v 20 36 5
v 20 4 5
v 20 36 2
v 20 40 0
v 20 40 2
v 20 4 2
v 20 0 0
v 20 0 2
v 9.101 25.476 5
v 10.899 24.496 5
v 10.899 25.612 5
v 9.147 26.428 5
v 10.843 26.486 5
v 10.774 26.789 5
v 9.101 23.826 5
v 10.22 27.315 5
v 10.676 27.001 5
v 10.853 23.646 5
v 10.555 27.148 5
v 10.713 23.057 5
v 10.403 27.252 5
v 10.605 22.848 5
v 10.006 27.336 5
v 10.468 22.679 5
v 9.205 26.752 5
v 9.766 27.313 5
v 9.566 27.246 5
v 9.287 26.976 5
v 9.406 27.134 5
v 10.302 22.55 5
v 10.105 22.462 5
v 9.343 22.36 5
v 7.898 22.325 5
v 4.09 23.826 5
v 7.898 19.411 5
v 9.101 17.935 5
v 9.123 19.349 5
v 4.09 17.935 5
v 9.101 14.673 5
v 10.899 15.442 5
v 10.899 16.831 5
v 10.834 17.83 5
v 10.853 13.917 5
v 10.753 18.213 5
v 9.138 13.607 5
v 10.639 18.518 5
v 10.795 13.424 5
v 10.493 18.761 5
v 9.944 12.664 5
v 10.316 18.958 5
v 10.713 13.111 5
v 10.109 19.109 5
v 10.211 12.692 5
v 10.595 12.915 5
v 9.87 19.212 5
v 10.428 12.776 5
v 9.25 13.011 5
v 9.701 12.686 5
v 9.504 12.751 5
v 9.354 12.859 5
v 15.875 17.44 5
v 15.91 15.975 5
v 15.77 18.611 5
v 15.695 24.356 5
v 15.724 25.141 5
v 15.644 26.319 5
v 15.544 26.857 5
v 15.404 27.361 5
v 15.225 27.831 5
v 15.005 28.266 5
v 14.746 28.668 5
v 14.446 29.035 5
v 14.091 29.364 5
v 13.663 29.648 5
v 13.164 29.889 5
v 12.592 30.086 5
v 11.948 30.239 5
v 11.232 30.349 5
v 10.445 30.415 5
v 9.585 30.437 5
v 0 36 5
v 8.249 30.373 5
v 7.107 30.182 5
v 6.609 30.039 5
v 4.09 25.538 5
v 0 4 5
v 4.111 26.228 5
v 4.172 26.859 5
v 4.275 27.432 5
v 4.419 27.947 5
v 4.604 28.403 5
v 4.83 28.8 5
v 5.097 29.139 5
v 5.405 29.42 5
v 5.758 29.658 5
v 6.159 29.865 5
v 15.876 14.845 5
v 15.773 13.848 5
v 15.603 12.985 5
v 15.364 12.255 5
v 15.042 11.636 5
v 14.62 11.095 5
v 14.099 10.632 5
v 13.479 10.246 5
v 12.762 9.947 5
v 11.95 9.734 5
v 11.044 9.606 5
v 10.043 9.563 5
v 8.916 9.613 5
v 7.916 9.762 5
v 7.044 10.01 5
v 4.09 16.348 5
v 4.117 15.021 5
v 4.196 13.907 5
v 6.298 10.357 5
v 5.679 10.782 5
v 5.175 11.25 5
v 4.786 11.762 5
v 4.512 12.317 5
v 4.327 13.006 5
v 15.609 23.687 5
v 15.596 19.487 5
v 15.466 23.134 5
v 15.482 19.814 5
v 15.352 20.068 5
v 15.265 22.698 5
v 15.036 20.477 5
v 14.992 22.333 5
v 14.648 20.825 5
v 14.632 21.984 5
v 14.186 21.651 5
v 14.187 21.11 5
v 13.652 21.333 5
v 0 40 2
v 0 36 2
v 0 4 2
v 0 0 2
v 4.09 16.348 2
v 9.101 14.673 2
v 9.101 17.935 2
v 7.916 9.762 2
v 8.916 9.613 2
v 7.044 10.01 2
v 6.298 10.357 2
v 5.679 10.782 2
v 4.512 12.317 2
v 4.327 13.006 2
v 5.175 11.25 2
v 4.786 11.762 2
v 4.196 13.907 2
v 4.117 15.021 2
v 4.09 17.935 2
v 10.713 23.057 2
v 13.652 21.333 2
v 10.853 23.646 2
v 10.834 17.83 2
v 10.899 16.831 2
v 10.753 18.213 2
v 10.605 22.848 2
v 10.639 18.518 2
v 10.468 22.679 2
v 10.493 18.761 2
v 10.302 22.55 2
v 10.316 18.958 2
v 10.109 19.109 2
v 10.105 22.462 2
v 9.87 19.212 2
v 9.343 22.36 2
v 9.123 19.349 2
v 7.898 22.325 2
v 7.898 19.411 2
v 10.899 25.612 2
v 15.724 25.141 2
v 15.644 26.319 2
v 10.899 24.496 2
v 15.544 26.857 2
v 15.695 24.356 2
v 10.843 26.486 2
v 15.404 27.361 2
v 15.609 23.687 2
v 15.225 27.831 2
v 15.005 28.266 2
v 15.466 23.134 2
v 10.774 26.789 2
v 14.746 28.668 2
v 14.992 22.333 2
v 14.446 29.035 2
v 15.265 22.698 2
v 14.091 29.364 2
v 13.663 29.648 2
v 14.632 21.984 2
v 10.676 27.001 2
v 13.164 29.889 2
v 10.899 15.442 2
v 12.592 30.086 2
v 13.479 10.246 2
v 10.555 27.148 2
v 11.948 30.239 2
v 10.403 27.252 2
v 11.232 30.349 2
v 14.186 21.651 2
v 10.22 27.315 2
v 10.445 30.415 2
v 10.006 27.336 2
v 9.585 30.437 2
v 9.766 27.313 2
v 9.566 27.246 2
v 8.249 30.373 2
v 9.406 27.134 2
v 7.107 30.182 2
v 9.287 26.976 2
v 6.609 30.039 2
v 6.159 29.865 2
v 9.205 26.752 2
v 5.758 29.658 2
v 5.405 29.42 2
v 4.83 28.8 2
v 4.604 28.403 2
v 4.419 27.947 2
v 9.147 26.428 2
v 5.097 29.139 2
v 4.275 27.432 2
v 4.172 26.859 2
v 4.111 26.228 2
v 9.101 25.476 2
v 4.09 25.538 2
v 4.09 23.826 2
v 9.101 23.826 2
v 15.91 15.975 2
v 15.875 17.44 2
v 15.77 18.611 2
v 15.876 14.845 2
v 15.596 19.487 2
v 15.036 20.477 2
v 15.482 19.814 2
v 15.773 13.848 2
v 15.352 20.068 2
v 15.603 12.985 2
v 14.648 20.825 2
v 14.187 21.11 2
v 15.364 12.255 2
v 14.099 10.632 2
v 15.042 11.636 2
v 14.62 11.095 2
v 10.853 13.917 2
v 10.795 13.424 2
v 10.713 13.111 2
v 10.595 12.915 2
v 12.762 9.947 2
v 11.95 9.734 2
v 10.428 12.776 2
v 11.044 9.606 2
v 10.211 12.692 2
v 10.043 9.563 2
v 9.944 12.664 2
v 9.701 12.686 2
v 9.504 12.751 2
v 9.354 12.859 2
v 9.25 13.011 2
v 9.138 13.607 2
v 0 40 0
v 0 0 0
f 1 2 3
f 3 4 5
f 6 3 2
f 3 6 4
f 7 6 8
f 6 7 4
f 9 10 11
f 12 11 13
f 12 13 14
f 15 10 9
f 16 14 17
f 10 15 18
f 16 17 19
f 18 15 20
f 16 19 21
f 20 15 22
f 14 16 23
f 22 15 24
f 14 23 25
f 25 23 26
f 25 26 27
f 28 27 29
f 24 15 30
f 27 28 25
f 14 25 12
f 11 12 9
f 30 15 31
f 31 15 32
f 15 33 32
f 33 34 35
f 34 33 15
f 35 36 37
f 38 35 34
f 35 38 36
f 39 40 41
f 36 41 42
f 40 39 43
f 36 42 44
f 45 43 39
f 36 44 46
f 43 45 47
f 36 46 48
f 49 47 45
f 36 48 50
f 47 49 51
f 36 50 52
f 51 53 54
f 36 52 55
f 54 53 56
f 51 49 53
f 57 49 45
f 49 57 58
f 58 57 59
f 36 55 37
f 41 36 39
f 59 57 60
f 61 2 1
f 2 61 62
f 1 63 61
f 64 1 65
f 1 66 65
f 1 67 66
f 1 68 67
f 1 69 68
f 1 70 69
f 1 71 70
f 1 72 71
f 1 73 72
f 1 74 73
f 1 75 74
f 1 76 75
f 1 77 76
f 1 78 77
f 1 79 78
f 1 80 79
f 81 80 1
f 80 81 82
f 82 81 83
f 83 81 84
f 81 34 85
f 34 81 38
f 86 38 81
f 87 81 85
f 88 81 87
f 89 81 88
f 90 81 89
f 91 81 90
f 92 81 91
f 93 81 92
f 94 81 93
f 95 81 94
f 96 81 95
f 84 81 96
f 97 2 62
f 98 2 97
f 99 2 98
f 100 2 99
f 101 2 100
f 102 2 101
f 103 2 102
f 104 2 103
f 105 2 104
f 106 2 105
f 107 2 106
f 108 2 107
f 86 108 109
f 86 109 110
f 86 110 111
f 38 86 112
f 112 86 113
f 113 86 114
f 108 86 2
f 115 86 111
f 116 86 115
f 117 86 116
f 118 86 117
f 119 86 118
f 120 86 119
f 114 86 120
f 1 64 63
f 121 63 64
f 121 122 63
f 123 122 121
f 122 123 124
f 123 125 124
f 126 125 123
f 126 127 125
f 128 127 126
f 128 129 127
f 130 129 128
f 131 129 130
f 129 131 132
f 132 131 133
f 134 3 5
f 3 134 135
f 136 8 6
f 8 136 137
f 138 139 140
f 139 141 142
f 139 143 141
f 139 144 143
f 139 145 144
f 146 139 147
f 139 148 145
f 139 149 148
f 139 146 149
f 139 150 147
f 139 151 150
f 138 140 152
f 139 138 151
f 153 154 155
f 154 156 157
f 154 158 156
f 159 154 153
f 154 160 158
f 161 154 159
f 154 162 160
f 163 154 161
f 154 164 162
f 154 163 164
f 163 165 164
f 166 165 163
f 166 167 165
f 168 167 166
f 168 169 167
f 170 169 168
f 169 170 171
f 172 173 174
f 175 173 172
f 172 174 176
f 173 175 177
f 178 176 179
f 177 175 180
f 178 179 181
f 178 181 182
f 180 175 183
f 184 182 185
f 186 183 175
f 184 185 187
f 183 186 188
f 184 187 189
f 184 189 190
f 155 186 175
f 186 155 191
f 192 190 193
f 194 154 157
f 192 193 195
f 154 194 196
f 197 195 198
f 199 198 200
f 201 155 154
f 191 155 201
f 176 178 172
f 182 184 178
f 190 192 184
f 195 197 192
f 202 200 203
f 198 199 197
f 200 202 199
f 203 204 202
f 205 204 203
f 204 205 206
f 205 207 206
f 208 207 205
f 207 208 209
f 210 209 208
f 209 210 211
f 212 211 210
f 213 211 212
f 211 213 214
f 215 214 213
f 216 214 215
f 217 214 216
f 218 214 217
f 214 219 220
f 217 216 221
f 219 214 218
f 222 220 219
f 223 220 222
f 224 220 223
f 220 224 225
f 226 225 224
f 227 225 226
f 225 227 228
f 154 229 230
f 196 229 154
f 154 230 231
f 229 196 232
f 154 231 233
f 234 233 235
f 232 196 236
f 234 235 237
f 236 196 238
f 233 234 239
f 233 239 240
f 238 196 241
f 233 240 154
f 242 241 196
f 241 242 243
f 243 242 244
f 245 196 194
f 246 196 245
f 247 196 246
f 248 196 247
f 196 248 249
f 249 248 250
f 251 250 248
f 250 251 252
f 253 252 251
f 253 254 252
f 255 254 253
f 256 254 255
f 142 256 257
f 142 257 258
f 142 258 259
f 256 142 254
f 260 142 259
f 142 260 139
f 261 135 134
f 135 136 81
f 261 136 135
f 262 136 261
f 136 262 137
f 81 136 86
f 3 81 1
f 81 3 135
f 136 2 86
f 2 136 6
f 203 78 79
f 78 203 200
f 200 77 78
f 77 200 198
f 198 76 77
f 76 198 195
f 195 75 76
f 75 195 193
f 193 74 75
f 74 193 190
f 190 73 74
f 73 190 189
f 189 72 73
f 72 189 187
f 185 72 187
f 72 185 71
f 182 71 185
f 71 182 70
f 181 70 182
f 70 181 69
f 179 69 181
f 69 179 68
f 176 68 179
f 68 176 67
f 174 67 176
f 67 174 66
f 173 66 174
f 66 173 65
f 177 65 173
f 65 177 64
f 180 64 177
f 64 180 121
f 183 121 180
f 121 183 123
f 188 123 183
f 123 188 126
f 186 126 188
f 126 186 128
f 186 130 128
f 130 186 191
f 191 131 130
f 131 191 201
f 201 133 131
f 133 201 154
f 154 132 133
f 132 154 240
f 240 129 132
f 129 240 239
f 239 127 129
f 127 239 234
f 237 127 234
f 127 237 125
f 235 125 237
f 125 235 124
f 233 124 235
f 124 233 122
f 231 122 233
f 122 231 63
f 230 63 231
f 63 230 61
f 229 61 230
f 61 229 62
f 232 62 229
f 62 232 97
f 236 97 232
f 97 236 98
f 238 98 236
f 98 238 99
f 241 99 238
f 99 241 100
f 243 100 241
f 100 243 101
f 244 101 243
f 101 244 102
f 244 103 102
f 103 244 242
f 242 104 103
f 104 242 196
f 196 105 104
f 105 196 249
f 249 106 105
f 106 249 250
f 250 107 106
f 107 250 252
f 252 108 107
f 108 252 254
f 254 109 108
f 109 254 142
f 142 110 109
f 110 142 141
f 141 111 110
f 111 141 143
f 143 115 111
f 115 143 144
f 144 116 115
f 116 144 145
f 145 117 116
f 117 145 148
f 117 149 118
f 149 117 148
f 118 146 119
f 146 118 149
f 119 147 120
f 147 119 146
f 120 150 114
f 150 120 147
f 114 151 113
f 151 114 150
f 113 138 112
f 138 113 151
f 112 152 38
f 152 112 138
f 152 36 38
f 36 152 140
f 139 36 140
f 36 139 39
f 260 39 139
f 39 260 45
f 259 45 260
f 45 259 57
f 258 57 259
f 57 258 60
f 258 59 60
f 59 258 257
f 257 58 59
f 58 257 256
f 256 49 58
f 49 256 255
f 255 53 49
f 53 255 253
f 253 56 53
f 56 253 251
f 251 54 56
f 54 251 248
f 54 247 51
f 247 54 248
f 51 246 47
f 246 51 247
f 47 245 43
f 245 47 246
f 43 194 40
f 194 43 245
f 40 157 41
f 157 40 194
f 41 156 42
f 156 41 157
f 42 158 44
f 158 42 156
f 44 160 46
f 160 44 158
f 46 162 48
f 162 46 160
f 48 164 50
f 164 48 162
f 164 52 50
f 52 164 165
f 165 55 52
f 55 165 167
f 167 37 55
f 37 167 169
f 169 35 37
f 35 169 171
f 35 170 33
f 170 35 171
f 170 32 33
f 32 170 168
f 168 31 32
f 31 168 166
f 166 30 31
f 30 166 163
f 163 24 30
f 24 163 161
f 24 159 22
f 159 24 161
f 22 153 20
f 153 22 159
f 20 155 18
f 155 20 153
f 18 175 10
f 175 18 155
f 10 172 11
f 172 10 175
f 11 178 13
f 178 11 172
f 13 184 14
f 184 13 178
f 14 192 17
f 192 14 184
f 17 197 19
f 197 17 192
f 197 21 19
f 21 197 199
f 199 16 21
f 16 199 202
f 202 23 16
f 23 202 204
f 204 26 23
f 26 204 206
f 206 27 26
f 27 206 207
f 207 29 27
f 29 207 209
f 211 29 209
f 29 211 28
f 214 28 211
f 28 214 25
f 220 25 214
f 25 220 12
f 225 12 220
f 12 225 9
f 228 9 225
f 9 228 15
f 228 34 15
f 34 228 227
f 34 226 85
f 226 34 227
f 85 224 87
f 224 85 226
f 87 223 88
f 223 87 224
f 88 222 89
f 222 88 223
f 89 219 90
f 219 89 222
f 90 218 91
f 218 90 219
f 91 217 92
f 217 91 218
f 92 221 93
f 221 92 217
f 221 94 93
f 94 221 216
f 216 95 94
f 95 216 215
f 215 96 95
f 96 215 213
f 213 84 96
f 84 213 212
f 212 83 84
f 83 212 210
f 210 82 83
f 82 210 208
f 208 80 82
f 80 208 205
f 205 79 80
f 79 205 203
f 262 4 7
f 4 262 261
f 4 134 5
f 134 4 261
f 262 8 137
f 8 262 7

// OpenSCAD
/*
	name: 		fixme-price-list-franc-frame.scad
	author:	Aymeric B.
	date:		02.09.2014
*/

use <francs-digits.scad>;

/****** PARAMETERS ****/
$fn = 50;
fudge = 0.1;
_thickness = 2;
_clearance = 0.1;

_frame_height = 40;
_frame_width = 20;
_cleat_size = 4;
_cleat_elevation = 2;
_elevation = 5;
print = 3;

/****** MODULES ****/
module RoundingEdge(radius, length) {	
	difference() {
		translate([0, 0, -_clearance]) {
			cube([2*radius+_clearance, 
					2*radius+_clearance, 
					length+2*_clearance]);
		}
		translate([0, 0, -2*_clearance]) {
			cylinder(r=radius,h=length+4*_clearance);
		}
	}
}

module BackPlate(width, height, thickness) {
	cube([width, height, thickness]);
}

module FrameFull(width, height, elevation) {
	cube([width, height, elevation]);
}

module Draw(number) {
	BackPlate(_frame_width, _frame_height, _cleat_elevation);
	translate([0, _cleat_size, _cleat_elevation]) {
		difference() {
			FrameFull(_frame_width, 
							_frame_height-2*_cleat_size, 
							_elevation-_cleat_elevation);
			translate([_frame_width/2, _frame_height/2-_cleat_size, 0]) {
				franc_digit(print, _elevation);
			}
		}
	}
}

/****** RENDERS ****/
if (print >= 0 && print <= 9) {
	echo ("Call Draw(print)");
	Draw();
} else {
	echo ("ERROR: print must be between 0 and 9.");
}
